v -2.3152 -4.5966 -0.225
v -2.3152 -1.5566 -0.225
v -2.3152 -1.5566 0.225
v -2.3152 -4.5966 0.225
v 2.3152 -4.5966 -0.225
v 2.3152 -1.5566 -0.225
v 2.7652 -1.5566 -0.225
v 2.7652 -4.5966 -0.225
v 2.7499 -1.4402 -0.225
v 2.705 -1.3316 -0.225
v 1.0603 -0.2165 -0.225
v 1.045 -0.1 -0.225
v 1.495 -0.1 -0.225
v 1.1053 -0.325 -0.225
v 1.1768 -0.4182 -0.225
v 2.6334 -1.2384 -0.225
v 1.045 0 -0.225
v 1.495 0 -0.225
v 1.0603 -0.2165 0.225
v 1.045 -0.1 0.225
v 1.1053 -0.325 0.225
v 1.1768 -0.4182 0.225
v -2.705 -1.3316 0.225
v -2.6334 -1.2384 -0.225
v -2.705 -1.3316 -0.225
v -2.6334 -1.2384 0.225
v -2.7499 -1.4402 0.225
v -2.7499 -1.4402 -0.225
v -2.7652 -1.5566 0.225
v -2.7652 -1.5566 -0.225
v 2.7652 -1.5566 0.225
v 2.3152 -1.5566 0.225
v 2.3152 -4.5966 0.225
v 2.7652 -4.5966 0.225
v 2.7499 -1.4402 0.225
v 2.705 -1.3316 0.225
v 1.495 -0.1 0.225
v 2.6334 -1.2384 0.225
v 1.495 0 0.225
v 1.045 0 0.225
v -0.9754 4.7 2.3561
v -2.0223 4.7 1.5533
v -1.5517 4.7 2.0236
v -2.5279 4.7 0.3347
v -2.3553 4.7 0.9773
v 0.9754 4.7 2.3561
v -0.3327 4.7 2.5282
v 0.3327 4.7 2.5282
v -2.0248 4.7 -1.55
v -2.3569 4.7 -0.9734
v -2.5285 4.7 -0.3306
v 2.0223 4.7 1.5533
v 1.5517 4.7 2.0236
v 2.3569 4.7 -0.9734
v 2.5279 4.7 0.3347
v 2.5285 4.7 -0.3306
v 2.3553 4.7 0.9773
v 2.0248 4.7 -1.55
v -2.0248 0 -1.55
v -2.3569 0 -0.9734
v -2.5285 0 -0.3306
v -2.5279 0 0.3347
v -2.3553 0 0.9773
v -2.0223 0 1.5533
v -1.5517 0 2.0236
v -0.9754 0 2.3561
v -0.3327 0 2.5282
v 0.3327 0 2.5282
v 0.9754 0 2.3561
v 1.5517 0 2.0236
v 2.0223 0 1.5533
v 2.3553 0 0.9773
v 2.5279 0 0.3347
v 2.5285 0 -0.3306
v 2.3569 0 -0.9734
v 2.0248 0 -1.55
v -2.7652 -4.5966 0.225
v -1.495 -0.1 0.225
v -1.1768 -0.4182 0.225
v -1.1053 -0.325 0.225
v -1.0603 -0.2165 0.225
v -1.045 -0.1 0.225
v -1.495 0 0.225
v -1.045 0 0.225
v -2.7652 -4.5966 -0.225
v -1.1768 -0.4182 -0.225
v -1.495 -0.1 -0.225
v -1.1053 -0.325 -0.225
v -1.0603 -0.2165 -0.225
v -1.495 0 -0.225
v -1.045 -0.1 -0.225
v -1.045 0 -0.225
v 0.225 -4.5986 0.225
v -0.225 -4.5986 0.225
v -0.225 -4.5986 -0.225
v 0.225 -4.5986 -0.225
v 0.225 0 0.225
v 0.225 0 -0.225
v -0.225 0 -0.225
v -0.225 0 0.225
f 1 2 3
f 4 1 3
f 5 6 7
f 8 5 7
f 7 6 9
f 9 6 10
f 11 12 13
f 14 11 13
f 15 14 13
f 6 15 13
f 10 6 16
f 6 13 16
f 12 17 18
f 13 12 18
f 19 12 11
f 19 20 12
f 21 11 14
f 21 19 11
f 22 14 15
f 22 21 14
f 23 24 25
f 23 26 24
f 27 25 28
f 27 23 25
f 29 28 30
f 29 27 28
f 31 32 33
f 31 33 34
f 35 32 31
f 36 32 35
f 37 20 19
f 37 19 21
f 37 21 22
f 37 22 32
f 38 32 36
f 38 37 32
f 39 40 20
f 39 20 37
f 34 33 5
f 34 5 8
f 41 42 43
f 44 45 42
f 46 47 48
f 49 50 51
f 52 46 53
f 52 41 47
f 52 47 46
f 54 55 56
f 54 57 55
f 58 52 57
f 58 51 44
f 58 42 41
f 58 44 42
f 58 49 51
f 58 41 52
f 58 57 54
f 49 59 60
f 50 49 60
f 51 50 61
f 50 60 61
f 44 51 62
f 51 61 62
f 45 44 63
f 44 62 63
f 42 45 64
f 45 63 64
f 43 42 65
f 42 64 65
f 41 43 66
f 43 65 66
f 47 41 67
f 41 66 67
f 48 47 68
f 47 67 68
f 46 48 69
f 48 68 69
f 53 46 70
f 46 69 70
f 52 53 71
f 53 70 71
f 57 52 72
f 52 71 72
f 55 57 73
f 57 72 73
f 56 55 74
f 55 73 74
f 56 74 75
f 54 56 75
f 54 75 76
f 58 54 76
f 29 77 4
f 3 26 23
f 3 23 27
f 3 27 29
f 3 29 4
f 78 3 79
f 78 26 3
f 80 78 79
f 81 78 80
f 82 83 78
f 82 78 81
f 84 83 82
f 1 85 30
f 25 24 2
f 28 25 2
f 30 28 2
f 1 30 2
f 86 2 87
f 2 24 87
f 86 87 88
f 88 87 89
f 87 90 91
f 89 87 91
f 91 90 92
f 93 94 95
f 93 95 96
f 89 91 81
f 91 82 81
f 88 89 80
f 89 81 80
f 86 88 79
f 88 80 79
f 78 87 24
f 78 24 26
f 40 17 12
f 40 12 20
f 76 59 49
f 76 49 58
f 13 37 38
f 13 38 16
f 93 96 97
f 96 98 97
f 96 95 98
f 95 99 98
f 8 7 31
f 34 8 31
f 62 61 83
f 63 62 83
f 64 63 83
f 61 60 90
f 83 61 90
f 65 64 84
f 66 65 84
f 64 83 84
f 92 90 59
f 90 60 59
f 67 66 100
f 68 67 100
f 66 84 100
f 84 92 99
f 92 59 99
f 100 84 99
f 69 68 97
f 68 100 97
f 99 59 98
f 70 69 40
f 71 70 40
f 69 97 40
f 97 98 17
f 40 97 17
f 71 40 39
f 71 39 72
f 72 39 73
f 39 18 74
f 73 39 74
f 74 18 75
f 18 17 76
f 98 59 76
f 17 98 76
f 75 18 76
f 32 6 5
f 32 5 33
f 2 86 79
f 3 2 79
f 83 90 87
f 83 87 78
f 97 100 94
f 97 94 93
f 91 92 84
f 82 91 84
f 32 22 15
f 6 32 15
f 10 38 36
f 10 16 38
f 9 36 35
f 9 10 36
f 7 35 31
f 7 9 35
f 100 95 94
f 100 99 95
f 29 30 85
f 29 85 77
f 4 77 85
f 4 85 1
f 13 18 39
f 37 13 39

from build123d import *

# Parameters (mm, degrees)
SKETCH3_R       = 2.55
EXTRUDE2_DEPTH  = 4.7
EXTRUDE3_DEPTH  = 6.924103308
SKETCH13_W      = 0.45
SKETCH13_H      = 0.45
EXTRUDE8_DEPTH  = 0.1
SKETCH12_W      = 0.45
SKETCH12_H      = 0.45
EXTRUDE9_DEPTH  = 0.1
SKETCH11_W      = 0.45
SKETCH11_H      = 0.45
EXTRUDE10_DEPTH = 1.598630162
SKETCH32_W      = 0.45
SKETCH32_H      = 0.45
REVOLVE4_ANGLE  = 45
SKETCH34_W      = 0.45
SKETCH34_H      = 0.45
EXTRUDE12_DEPTH = 1.61
SKETCH36_W      = 0.45
SKETCH36_H      = 0.45
REVOLVE5_ANGLE  = 45
SKETCH37_W      = 0.45
SKETCH37_H      = 0.45
EXTRUDE13_DEPTH = 3.04
SKETCH38_W      = 0.45
SKETCH38_H      = 0.45
REVOLVE6_ANGLE  = 45
SKETCH39_W      = 0.45
SKETCH39_H      = 0.45
EXTRUDE14_DEPTH = 1.61
SKETCH40_W      = 0.45
SKETCH40_H      = 0.45
REVOLVE7_ANGLE  = 45
SKETCH41_W      = 0.45
SKETCH41_H      = 0.45
EXTRUDE15_DEPTH = 3.04
SKETCH42_W      = 0.45
SKETCH42_H      = 0.45
EXTRUDE16_DEPTH = 3


with BuildPart() as part:
    # Sketch3 → Extrude2 (new body)
    with BuildSketch(Plane(origin=(0, 0, 0), x_dir=(1, 0, 0), z_dir=(0, 1, 0))):
        Circle(SKETCH3_R)
    extrude(amount=EXTRUDE2_DEPTH)

    # Sketch3<3> → Extrude3 (cut, through all)
    with BuildSketch(Plane(origin=(0, 0, 0), x_dir=(1, 0, 0), z_dir=(0, 1, 0))):
        with BuildLine():
            ThreePointArc((2.024845673, 1.55), (0, 2.55), (-2.024845673, 1.55))
            Line((-2.024845673, 1.55), (2.024845673, 1.55))
        make_face()
    extrude(amount=EXTRUDE3_DEPTH, mode=Mode.SUBTRACT)

    # Sketch13 → Extrude8 (add)
    with BuildSketch(Plane.XZ):
        with Locations((1.27, 0)):
            Rectangle(SKETCH13_W, SKETCH13_H)
    extrude(amount=EXTRUDE8_DEPTH)

    # Sketch12 → Extrude9 (add)
    with BuildSketch(Plane.XZ):
        with Locations((-1.27, 0)):
            Rectangle(SKETCH12_W, SKETCH12_H)
    extrude(amount=EXTRUDE9_DEPTH)

    # Sketch11 → Extrude10 (add)
    with BuildSketch(Plane.XZ):
        Rectangle(SKETCH11_W, SKETCH11_H)
    extrude(amount=EXTRUDE10_DEPTH)

    # Sketch32 → Revolve4 (revolve)
    with BuildSketch(Plane.XZ.offset(0.1)):
        with Locations((-1.27, 0)):
            Rectangle(SKETCH32_W, SKETCH32_H)
    revolve(axis=Axis((-1.495, -0.1, 0.225), (0, 0, -1)), revolution_arc=REVOLVE4_ANGLE)

    # Sketch34 → Extrude12 (add)
    with BuildSketch(Plane(origin=(-0.7975, -0.7975, 0), x_dir=(0, 0, 1), z_dir=(-0.7071067811865488, -0.7071067811865462, 0))):
        with Locations((0, 0.76141396)):
            Rectangle(SKETCH34_W, SKETCH34_H)
    extrude(amount=EXTRUDE12_DEPTH)

    # Sketch36 → Revolve5 (revolve)
    with BuildSketch(Plane(origin=(-1.935941918, -1.935941918, 0), x_dir=(0, 0, 1), z_dir=(-0.7071067811865487, -0.7071067811865464, 0))):
        with Locations((0, 0.76141396)):
            Rectangle(SKETCH36_W, SKETCH36_H)
    revolve(axis=Axis((-2.315243866, -1.556639969, -0.225), (0, 0, 1)), revolution_arc=REVOLVE5_ANGLE)

    # Sketch37 → Extrude13 (add)
    with BuildSketch(Plane.XZ.offset(1.556639969)):
        with Locations((-2.540243866, 0)):
            Rectangle(SKETCH37_W, SKETCH37_H)
    extrude(amount=EXTRUDE13_DEPTH)

    # Sketch38 → Revolve6 (revolve)
    with BuildSketch(Plane.XZ.offset(0.1)):
        with Locations((1.27, 0)):
            Rectangle(SKETCH38_W, SKETCH38_H)
    revolve(axis=Axis((1.495, -0.1, 0.225), (0, 0, 1)), revolution_arc=REVOLVE6_ANGLE)

    # Sketch39 → Extrude14 (add)
    with BuildSketch(Plane(origin=(0.7975, -0.7975, 0), x_dir=(0, 0, -1), z_dir=(0.7071067811865488, -0.7071067811865462, 0))):
        with Locations((0, 0.76141396)):
            Rectangle(SKETCH39_W, SKETCH39_H)
    extrude(amount=EXTRUDE14_DEPTH)

    # Sketch40 → Revolve7 (revolve)
    with BuildSketch(Plane(origin=(1.935941918, -1.935941918, 0), x_dir=(0, 0, -1), z_dir=(0.7071067811865488, -0.7071067811865464, 0))):
        with Locations((0, 0.76141396)):
            Rectangle(SKETCH40_W, SKETCH40_H)
    revolve(axis=Axis((2.315243866, -1.556639969, 0.225), (0, 0, -1)), revolution_arc=REVOLVE7_ANGLE)

    # Sketch41 → Extrude15 (add)
    with BuildSketch(Plane.XZ.offset(1.556639969)):
        with Locations((2.540243866, 0)):
            Rectangle(SKETCH41_W, SKETCH41_H)
    extrude(amount=EXTRUDE15_DEPTH)

    # Sketch42 → Extrude16 (add)
    with BuildSketch(Plane.XZ.offset(1.598630162)):
        Rectangle(SKETCH42_W, SKETCH42_H)
    extrude(amount=EXTRUDE16_DEPTH)


solid = part.part
